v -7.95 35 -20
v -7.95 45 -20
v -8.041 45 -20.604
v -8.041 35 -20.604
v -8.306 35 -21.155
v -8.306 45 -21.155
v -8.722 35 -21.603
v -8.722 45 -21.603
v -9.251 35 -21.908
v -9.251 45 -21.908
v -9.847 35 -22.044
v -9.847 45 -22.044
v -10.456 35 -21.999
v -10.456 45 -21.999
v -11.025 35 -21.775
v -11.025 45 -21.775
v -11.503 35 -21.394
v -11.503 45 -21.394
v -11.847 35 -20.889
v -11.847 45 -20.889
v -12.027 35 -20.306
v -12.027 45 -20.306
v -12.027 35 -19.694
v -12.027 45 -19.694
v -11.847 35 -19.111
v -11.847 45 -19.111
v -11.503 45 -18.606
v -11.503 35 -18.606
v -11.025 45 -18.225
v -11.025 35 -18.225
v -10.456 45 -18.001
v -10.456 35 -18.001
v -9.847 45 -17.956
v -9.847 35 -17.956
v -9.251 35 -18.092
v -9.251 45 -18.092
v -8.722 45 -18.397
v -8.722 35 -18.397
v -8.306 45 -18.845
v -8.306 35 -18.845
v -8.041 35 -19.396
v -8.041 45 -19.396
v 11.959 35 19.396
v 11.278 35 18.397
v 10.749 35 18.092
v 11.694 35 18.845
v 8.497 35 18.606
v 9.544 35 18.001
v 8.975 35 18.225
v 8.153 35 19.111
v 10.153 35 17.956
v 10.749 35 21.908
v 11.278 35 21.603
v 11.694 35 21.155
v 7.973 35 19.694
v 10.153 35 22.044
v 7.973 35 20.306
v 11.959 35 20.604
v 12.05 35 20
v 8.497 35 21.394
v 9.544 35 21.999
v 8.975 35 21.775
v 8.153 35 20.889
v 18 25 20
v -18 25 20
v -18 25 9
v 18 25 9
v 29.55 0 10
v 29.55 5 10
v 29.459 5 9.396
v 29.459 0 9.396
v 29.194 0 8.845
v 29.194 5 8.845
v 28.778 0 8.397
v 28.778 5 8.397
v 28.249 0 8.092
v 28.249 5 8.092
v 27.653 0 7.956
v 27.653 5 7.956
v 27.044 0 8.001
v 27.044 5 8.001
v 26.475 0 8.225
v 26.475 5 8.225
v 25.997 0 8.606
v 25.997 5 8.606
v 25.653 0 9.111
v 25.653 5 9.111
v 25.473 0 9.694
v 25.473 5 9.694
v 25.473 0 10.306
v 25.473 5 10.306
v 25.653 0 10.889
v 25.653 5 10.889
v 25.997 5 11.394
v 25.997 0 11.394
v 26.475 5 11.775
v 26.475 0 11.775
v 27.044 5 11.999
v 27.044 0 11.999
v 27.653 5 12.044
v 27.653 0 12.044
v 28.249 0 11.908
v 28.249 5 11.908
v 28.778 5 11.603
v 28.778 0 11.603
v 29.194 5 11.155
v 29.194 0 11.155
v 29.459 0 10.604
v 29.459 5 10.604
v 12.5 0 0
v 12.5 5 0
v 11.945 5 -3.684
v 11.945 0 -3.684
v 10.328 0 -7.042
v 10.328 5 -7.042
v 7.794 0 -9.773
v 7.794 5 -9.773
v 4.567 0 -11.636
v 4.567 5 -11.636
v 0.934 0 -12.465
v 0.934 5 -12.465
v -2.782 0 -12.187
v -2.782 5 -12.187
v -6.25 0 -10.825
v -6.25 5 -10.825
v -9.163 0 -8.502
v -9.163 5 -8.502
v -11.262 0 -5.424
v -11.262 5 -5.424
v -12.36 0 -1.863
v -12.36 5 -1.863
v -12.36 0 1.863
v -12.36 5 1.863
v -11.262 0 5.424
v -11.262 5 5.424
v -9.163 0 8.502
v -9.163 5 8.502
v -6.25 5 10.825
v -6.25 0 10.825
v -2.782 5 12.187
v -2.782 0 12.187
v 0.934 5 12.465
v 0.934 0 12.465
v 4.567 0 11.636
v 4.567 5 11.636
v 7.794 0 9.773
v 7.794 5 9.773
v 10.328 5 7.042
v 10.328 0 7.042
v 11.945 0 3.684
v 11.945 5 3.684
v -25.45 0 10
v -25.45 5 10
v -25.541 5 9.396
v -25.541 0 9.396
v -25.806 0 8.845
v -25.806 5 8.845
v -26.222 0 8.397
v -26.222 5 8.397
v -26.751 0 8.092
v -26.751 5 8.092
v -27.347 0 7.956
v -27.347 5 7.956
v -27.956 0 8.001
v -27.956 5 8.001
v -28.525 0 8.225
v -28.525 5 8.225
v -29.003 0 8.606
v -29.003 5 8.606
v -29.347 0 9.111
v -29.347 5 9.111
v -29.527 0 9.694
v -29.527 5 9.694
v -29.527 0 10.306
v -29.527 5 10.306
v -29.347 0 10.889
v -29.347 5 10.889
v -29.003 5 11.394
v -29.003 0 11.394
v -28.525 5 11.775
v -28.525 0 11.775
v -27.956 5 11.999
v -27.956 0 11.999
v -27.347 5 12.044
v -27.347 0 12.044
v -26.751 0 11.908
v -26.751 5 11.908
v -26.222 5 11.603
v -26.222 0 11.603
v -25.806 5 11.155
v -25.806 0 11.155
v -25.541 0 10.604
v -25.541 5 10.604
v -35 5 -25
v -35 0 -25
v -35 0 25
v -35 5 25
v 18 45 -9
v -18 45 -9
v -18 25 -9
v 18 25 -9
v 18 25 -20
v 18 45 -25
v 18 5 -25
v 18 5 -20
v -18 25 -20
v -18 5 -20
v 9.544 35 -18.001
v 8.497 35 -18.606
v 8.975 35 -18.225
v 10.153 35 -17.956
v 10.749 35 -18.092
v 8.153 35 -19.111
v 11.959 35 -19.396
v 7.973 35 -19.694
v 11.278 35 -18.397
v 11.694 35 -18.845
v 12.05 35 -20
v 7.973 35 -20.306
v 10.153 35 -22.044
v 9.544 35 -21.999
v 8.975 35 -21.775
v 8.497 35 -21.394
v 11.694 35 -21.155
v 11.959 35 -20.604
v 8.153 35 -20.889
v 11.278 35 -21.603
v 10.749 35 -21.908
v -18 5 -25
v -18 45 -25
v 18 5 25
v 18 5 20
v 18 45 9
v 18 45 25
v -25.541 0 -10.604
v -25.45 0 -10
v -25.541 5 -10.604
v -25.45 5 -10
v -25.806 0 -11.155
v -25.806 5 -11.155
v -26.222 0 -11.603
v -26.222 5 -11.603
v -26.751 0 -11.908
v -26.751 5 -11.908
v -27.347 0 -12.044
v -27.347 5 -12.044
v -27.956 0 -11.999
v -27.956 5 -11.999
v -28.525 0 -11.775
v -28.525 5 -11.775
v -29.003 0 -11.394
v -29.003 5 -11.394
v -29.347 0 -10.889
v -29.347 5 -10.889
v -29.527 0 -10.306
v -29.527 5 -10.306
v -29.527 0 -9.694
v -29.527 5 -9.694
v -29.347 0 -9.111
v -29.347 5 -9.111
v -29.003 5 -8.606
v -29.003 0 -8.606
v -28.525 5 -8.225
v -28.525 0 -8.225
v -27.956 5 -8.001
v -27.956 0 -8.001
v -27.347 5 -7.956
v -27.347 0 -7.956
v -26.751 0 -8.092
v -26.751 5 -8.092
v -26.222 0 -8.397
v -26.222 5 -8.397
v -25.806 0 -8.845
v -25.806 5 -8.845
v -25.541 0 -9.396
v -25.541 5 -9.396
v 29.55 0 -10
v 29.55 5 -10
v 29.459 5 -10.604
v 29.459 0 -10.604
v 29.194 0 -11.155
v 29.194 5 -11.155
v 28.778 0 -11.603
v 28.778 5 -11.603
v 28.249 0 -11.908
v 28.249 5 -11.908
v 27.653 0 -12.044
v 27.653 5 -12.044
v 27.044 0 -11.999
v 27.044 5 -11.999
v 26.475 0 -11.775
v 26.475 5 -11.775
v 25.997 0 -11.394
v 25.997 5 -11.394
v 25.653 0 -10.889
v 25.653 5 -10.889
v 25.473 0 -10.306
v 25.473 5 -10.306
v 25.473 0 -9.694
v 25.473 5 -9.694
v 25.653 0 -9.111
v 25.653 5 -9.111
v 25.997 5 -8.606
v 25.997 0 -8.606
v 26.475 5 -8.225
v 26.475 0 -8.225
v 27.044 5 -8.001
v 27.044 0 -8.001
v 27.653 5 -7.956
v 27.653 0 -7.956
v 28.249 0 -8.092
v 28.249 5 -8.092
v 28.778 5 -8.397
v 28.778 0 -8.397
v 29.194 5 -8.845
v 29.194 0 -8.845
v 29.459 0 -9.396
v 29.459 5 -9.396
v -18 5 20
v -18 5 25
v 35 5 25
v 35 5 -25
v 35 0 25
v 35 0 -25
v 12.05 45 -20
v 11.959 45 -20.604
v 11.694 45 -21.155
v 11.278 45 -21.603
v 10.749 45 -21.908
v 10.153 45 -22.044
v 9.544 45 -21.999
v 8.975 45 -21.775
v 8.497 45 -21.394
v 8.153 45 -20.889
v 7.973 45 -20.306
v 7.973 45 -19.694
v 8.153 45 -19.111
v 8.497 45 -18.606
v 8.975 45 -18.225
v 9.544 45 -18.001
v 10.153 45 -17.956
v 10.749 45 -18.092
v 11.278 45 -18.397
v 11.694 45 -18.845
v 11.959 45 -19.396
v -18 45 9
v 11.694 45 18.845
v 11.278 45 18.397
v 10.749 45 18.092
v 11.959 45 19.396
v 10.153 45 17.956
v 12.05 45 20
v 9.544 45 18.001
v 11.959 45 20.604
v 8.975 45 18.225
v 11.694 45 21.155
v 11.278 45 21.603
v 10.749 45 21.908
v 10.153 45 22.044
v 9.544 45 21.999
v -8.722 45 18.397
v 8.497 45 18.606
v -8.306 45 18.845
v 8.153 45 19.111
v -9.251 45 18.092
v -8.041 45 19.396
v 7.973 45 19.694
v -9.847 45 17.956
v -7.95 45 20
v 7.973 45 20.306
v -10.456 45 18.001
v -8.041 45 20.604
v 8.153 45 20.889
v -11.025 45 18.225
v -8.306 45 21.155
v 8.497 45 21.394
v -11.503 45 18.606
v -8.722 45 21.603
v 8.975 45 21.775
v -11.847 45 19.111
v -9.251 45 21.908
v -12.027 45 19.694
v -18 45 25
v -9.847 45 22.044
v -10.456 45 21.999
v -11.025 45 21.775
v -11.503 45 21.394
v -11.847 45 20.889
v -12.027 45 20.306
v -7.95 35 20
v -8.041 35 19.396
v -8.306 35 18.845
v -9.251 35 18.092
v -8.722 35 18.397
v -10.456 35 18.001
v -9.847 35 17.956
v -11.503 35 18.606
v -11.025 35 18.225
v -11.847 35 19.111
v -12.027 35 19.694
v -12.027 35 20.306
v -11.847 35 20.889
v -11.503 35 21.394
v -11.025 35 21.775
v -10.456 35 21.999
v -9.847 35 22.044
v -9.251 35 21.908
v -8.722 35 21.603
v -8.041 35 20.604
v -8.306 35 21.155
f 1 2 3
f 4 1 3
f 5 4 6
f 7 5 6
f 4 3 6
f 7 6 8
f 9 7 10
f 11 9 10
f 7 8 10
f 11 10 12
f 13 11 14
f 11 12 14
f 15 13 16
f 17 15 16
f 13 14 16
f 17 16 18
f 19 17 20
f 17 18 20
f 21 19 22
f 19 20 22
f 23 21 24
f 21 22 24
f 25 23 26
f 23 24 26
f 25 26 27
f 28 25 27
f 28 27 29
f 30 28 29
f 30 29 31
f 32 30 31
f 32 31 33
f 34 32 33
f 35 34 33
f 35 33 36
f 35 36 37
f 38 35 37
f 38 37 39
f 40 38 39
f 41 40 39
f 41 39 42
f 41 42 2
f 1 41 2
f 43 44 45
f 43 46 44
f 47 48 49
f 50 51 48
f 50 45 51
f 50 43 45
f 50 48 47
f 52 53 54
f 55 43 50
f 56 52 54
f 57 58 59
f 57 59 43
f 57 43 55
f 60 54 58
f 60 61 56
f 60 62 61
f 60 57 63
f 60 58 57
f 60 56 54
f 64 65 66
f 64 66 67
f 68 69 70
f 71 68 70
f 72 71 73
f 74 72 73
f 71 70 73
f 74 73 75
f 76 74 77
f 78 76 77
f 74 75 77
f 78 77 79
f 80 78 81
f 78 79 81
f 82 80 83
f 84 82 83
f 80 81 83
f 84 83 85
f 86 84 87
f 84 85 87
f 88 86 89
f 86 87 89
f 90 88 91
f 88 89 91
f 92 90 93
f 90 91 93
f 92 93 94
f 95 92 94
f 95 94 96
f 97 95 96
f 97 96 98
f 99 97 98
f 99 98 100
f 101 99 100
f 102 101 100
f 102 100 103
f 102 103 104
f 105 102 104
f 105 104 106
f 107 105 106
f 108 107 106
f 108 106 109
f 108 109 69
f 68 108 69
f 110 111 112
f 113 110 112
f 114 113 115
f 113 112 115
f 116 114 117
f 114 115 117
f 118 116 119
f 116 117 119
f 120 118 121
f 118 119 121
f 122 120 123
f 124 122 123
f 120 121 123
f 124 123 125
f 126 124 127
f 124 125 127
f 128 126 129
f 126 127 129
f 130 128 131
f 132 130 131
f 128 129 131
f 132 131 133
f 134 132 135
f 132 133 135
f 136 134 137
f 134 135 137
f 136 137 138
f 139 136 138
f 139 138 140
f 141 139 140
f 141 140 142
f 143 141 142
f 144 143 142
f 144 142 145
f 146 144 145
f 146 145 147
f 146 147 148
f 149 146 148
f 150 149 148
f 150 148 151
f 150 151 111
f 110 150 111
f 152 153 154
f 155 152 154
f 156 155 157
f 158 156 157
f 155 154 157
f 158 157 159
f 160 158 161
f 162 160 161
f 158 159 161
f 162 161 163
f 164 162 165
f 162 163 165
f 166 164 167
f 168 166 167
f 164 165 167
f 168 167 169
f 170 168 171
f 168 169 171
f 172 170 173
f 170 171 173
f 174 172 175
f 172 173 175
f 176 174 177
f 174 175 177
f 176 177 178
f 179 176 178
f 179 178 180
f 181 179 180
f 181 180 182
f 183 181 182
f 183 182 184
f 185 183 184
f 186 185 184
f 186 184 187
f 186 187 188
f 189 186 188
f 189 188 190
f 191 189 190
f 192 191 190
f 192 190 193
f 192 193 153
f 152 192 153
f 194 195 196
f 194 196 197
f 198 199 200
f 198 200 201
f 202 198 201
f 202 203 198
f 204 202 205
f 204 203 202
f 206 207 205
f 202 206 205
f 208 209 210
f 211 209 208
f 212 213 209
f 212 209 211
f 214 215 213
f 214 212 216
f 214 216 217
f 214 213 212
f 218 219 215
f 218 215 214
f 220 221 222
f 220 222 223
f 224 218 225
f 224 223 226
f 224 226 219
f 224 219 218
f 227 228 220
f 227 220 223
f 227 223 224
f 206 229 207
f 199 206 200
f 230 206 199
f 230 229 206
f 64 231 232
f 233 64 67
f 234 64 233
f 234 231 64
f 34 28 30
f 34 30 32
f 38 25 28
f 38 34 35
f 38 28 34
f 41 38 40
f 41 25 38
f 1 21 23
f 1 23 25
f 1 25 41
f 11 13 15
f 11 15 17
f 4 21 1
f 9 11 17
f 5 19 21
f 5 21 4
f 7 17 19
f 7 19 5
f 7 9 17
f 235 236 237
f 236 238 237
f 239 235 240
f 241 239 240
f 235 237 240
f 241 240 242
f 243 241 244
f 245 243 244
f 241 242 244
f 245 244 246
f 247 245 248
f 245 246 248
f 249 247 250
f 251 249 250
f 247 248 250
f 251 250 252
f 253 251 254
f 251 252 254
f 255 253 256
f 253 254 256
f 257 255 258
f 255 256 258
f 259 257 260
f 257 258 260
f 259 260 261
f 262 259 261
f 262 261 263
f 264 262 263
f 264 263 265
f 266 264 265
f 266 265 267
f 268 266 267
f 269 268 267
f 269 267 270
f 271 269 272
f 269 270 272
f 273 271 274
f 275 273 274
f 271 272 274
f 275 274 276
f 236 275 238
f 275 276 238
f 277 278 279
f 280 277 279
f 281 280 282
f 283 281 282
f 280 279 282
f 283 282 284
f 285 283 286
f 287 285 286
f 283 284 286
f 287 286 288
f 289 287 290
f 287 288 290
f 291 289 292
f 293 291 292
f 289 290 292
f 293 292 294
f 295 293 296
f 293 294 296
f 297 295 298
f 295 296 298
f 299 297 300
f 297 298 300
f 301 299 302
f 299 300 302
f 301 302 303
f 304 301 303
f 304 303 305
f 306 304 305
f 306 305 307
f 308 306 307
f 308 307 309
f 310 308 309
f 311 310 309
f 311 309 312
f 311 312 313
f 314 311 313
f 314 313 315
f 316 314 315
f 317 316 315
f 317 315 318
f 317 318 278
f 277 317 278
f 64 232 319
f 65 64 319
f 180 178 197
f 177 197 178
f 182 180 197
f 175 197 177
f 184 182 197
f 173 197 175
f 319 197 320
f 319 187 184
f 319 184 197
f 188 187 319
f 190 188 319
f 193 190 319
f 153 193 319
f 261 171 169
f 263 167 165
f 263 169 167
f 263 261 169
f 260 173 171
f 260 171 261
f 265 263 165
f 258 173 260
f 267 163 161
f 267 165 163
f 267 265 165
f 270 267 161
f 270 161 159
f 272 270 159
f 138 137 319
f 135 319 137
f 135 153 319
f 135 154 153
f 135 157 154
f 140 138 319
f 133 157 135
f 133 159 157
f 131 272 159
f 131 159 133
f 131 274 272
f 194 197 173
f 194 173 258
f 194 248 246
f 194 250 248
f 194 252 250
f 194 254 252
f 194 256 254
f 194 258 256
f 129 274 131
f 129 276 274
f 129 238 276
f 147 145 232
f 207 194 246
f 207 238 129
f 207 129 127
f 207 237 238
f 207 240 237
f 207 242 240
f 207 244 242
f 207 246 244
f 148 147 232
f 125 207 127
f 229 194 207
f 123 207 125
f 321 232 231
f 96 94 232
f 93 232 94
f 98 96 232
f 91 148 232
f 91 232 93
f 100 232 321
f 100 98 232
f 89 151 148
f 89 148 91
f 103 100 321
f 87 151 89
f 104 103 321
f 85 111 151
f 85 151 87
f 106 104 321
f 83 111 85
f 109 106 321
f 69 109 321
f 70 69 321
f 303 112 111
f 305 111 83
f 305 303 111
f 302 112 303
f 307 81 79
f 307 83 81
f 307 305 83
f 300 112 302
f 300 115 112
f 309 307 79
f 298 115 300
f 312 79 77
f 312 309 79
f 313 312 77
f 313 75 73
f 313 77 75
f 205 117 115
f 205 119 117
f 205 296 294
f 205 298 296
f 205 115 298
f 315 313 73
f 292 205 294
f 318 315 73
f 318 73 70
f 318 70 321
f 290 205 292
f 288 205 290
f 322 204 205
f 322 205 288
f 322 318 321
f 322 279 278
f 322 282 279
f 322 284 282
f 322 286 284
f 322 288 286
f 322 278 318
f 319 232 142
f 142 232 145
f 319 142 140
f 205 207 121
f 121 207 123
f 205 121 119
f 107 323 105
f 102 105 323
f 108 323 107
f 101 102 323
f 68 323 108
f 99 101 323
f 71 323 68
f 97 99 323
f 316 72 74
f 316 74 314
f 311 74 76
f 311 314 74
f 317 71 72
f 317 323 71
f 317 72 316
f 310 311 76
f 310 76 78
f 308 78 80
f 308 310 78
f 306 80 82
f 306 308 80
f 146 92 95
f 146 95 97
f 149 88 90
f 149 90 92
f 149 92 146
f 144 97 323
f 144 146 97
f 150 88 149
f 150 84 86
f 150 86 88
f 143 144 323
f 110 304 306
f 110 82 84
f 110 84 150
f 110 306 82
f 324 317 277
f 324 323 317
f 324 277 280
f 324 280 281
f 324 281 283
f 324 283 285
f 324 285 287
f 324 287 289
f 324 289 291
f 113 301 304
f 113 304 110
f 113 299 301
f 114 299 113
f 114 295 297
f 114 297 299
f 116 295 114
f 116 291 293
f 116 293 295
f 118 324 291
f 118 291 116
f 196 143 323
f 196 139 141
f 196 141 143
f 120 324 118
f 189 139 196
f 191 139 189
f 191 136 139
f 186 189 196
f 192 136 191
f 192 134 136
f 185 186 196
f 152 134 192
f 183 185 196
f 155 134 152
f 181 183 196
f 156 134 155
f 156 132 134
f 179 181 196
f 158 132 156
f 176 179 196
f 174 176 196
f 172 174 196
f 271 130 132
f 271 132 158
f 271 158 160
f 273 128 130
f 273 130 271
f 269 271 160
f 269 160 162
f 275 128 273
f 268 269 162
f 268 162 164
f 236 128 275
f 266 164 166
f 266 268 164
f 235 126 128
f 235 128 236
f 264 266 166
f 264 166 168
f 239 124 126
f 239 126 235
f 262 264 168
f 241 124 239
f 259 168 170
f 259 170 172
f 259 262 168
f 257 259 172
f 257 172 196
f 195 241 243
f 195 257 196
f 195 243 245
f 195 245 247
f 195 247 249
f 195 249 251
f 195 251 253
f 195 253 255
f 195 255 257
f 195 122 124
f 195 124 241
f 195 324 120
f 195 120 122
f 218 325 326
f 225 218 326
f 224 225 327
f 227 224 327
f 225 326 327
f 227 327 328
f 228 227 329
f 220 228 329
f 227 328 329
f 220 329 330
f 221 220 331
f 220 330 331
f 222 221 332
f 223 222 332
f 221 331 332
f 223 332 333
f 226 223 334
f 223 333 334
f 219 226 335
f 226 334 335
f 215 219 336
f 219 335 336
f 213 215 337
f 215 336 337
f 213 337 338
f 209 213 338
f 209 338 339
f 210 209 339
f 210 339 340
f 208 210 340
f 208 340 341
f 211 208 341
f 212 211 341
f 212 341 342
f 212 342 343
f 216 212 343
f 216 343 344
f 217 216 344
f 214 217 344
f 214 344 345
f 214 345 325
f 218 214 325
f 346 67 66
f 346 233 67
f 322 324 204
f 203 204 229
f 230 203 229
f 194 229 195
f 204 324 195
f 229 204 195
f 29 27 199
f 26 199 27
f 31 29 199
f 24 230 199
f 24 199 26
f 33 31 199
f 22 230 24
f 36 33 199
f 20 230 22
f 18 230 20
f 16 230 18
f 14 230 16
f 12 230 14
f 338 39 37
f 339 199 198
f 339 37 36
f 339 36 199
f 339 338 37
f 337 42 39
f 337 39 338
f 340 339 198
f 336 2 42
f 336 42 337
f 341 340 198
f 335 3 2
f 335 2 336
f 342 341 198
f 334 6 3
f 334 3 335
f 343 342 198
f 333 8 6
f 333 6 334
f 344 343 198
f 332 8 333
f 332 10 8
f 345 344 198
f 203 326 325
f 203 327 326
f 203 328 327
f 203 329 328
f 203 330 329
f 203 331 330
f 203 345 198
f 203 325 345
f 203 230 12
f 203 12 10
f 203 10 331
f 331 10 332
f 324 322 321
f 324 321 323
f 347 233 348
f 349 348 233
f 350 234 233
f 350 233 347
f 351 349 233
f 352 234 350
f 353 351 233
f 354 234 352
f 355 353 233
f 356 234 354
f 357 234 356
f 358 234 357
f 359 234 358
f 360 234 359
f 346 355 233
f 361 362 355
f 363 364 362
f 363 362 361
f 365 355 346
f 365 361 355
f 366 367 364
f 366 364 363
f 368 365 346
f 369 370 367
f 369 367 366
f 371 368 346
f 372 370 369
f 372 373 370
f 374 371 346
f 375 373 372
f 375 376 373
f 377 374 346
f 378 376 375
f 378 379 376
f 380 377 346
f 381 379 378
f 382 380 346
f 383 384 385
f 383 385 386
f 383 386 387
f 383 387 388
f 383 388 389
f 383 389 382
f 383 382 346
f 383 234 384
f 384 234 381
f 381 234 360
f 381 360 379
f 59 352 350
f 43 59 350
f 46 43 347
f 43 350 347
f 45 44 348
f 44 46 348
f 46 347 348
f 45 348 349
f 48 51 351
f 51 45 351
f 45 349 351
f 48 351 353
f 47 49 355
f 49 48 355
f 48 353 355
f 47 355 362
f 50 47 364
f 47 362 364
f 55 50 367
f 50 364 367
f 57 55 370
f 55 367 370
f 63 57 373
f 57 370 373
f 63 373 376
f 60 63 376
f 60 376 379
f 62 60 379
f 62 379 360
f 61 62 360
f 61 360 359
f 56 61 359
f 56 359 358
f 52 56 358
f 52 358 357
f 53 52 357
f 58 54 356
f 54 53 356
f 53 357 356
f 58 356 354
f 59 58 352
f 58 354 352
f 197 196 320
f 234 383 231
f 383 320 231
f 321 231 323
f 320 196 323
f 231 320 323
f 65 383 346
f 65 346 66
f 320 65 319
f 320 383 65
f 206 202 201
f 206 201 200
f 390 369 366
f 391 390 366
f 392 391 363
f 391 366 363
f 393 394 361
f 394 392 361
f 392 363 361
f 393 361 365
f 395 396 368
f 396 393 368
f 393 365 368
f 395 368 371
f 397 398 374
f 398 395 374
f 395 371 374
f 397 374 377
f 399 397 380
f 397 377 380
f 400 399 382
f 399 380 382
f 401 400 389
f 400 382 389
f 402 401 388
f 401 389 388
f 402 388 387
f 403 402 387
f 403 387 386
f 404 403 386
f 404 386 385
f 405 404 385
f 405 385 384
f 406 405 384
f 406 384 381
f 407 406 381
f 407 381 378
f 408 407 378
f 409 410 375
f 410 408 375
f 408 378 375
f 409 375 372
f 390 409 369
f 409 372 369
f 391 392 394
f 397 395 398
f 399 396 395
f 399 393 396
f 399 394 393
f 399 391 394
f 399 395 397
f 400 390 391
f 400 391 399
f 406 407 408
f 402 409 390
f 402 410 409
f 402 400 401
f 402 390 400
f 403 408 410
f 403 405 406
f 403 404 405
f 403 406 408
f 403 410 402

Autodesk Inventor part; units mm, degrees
ref_plane "YZ Plane" through (0, 0, 0) normal (1, 0, 0) x (0, 1, 0)
ref_plane "XZ Plane" through (0, 0, 0) normal (0, 1, 0) x (-1, 0, 0)
ref_plane "XY Plane" through (0, 0, 0) normal (0, 0, 1) x (1, 0, 0)
sketch "Sketch1" plane through (0, 0, 0) normal (0, 1, 0) x (-1, 0, 0)
  line L0 (35, 20) -> (-35, 20)
  line L1 (-35, 20) -> (-35, -20)
  line L2 (-35, -20) -> (35, -20)
  line L3 (35, -20) -> (35, 20)
  line L4 (35, 20) -> (-35, -20) construction
  line L5 (-35, 20) -> (35, -20) construction
  point P0 (0, 0)
  dimension "d0" = 70
  dimension "d1" = 40
extrude "Extrusion1" add sketch "Sketch1" along normal blind 5
sketch "Sketch2" plane through (0, 5, 0) normal (0, 1, 0) x (1, 0, 0)
  circle A0 centre (27.5, -10) radius 2.05
  circle A1 centre (27.5, 10) radius 2.05
  circle A2 centre (-27.5, 10) radius 2.05
  circle A3 centre (-27.5, -10) radius 2.05
  point P0 (0, 0)
  dimension "d4" = 4.1
  dimension "d5" = 27.5
  dimension "d6" = 10
  dimension "d7" = 4.1
  dimension "d8" = 4.1
  dimension "d9" = 4.1
  dimension "d10" = 10
  dimension "d11" = 27.5
  dimension "d12" = 27.5
  dimension "d13" = 10
  dimension "d14" = 10
  dimension "d15" = 27.5
extrude "Extrusion2" cut sketch "Sketch2" against normal blind 5
sketch "Sketch3" plane through (0, 5, 0) normal (0, 1, 0) x (1, 0, 0)
  circle A0 centre (0, 0) radius 12.5
  dimension "d18" = 25
extrude "Extrusion3" cut sketch "Sketch3" against normal blind 5
ref_plane "Work Plane1" through (-35, 0, 0) normal (0, 0, 1) x (1, 0, 0)
sketch "Sketch7" plane through (0, 0, 0) normal (0, -1, 0) x (1, 0, 0)
  line L0 (18, -25) -> (-18, -25)
  line L1 (-18, -25) -> (-18, -20)
  line L2 (-18, -20) -> (18, -20)
  line L3 (18, -20) -> (18, -25)
  line L4 (35, -20) -> (-35, -20) projected
  point P0 (0, 0)
  dimension "d38" = 36
  dimension "d39" = 5
  dimension "d40" = 18
extrude "Extrusion7" add sketch "Sketch7" against normal blind 45
sketch "Sketch8" plane through (-18, 5, -20) normal (0, 0, 1) x (1, 0, 0)
  line L0 (0, 40) -> (36, 40)
  line L1 (36, 40) -> (36, 20)
  line L2 (36, 20) -> (0, 20)
  line L3 (0, 20) -> (0, 40)
  line L4 (0, 40) -> (36, 40) projected
  line L5 (0, 0) -> (0, 40) projected
  line L6 (36, 0) -> (36, 40) projected
  point P0 (18, -5)
  dimension "d43" = 20
extrude "Extrusion8" add sketch "Sketch8" along normal blind 11
sketch "Sketch9" plane through (35, 0, -20) normal (0, 0, -1) x (-1, 0, 0)
  line L0 (0, 5) -> (17, 5)
  line L1 (17, 5) -> (17, 0)
  line L2 (17, 0) -> (0, 0)
  line L3 (0, 0) -> (0, 5)
  line L4 (53, 5) -> (70, 5)
  line L5 (70, 5) -> (70, 0)
  line L6 (70, 0) -> (53, 0)
  line L7 (53, 0) -> (53, 5)
  line L8 (53, 5) -> (70, 5) projected
  line L9 (53, 0) -> (53, 45) projected
  line L10 (53, 0) -> (70, 0) projected
  line L11 (70, 0) -> (70, 5) projected
  line L12 (17, 0) -> (17, 45) projected
  line L13 (0, 5) -> (17, 5) projected
  line L14 (0, 0) -> (0, 5) projected
  line L15 (0, 0) -> (17, 0) projected
  point P0 (35, 0)
extrude "Extrusion9" add sketch "Sketch9" along normal blind 5
sketch "Sketch10" plane through (0, 45, 0) normal (0, 1, 0) x (1, 0, 0)
  circle A0 centre (-10, 20) radius 2.05
  circle A1 centre (10, 20) radius 2.05
  line L0 (18, 25) -> (-18, 25) projected
  point P0 (0, 0)
  dimension "d48" = 4.1
  dimension "d49" = 4.1
  dimension "d50" = 10
  dimension "d51" = 10
  dimension "d52" = 5
  dimension "d53" = 5
extrude "Extrusion10" cut sketch "Sketch10" against normal blind 10
mirror "Mirror2" about plane through (-35, 0, 0) normal (0, 0, 1) of "Extrusion7", "Extrusion8", "Extrusion9", "Extrusion10"
properties part number "nozzle_bracket" material "ABS Plastic"
